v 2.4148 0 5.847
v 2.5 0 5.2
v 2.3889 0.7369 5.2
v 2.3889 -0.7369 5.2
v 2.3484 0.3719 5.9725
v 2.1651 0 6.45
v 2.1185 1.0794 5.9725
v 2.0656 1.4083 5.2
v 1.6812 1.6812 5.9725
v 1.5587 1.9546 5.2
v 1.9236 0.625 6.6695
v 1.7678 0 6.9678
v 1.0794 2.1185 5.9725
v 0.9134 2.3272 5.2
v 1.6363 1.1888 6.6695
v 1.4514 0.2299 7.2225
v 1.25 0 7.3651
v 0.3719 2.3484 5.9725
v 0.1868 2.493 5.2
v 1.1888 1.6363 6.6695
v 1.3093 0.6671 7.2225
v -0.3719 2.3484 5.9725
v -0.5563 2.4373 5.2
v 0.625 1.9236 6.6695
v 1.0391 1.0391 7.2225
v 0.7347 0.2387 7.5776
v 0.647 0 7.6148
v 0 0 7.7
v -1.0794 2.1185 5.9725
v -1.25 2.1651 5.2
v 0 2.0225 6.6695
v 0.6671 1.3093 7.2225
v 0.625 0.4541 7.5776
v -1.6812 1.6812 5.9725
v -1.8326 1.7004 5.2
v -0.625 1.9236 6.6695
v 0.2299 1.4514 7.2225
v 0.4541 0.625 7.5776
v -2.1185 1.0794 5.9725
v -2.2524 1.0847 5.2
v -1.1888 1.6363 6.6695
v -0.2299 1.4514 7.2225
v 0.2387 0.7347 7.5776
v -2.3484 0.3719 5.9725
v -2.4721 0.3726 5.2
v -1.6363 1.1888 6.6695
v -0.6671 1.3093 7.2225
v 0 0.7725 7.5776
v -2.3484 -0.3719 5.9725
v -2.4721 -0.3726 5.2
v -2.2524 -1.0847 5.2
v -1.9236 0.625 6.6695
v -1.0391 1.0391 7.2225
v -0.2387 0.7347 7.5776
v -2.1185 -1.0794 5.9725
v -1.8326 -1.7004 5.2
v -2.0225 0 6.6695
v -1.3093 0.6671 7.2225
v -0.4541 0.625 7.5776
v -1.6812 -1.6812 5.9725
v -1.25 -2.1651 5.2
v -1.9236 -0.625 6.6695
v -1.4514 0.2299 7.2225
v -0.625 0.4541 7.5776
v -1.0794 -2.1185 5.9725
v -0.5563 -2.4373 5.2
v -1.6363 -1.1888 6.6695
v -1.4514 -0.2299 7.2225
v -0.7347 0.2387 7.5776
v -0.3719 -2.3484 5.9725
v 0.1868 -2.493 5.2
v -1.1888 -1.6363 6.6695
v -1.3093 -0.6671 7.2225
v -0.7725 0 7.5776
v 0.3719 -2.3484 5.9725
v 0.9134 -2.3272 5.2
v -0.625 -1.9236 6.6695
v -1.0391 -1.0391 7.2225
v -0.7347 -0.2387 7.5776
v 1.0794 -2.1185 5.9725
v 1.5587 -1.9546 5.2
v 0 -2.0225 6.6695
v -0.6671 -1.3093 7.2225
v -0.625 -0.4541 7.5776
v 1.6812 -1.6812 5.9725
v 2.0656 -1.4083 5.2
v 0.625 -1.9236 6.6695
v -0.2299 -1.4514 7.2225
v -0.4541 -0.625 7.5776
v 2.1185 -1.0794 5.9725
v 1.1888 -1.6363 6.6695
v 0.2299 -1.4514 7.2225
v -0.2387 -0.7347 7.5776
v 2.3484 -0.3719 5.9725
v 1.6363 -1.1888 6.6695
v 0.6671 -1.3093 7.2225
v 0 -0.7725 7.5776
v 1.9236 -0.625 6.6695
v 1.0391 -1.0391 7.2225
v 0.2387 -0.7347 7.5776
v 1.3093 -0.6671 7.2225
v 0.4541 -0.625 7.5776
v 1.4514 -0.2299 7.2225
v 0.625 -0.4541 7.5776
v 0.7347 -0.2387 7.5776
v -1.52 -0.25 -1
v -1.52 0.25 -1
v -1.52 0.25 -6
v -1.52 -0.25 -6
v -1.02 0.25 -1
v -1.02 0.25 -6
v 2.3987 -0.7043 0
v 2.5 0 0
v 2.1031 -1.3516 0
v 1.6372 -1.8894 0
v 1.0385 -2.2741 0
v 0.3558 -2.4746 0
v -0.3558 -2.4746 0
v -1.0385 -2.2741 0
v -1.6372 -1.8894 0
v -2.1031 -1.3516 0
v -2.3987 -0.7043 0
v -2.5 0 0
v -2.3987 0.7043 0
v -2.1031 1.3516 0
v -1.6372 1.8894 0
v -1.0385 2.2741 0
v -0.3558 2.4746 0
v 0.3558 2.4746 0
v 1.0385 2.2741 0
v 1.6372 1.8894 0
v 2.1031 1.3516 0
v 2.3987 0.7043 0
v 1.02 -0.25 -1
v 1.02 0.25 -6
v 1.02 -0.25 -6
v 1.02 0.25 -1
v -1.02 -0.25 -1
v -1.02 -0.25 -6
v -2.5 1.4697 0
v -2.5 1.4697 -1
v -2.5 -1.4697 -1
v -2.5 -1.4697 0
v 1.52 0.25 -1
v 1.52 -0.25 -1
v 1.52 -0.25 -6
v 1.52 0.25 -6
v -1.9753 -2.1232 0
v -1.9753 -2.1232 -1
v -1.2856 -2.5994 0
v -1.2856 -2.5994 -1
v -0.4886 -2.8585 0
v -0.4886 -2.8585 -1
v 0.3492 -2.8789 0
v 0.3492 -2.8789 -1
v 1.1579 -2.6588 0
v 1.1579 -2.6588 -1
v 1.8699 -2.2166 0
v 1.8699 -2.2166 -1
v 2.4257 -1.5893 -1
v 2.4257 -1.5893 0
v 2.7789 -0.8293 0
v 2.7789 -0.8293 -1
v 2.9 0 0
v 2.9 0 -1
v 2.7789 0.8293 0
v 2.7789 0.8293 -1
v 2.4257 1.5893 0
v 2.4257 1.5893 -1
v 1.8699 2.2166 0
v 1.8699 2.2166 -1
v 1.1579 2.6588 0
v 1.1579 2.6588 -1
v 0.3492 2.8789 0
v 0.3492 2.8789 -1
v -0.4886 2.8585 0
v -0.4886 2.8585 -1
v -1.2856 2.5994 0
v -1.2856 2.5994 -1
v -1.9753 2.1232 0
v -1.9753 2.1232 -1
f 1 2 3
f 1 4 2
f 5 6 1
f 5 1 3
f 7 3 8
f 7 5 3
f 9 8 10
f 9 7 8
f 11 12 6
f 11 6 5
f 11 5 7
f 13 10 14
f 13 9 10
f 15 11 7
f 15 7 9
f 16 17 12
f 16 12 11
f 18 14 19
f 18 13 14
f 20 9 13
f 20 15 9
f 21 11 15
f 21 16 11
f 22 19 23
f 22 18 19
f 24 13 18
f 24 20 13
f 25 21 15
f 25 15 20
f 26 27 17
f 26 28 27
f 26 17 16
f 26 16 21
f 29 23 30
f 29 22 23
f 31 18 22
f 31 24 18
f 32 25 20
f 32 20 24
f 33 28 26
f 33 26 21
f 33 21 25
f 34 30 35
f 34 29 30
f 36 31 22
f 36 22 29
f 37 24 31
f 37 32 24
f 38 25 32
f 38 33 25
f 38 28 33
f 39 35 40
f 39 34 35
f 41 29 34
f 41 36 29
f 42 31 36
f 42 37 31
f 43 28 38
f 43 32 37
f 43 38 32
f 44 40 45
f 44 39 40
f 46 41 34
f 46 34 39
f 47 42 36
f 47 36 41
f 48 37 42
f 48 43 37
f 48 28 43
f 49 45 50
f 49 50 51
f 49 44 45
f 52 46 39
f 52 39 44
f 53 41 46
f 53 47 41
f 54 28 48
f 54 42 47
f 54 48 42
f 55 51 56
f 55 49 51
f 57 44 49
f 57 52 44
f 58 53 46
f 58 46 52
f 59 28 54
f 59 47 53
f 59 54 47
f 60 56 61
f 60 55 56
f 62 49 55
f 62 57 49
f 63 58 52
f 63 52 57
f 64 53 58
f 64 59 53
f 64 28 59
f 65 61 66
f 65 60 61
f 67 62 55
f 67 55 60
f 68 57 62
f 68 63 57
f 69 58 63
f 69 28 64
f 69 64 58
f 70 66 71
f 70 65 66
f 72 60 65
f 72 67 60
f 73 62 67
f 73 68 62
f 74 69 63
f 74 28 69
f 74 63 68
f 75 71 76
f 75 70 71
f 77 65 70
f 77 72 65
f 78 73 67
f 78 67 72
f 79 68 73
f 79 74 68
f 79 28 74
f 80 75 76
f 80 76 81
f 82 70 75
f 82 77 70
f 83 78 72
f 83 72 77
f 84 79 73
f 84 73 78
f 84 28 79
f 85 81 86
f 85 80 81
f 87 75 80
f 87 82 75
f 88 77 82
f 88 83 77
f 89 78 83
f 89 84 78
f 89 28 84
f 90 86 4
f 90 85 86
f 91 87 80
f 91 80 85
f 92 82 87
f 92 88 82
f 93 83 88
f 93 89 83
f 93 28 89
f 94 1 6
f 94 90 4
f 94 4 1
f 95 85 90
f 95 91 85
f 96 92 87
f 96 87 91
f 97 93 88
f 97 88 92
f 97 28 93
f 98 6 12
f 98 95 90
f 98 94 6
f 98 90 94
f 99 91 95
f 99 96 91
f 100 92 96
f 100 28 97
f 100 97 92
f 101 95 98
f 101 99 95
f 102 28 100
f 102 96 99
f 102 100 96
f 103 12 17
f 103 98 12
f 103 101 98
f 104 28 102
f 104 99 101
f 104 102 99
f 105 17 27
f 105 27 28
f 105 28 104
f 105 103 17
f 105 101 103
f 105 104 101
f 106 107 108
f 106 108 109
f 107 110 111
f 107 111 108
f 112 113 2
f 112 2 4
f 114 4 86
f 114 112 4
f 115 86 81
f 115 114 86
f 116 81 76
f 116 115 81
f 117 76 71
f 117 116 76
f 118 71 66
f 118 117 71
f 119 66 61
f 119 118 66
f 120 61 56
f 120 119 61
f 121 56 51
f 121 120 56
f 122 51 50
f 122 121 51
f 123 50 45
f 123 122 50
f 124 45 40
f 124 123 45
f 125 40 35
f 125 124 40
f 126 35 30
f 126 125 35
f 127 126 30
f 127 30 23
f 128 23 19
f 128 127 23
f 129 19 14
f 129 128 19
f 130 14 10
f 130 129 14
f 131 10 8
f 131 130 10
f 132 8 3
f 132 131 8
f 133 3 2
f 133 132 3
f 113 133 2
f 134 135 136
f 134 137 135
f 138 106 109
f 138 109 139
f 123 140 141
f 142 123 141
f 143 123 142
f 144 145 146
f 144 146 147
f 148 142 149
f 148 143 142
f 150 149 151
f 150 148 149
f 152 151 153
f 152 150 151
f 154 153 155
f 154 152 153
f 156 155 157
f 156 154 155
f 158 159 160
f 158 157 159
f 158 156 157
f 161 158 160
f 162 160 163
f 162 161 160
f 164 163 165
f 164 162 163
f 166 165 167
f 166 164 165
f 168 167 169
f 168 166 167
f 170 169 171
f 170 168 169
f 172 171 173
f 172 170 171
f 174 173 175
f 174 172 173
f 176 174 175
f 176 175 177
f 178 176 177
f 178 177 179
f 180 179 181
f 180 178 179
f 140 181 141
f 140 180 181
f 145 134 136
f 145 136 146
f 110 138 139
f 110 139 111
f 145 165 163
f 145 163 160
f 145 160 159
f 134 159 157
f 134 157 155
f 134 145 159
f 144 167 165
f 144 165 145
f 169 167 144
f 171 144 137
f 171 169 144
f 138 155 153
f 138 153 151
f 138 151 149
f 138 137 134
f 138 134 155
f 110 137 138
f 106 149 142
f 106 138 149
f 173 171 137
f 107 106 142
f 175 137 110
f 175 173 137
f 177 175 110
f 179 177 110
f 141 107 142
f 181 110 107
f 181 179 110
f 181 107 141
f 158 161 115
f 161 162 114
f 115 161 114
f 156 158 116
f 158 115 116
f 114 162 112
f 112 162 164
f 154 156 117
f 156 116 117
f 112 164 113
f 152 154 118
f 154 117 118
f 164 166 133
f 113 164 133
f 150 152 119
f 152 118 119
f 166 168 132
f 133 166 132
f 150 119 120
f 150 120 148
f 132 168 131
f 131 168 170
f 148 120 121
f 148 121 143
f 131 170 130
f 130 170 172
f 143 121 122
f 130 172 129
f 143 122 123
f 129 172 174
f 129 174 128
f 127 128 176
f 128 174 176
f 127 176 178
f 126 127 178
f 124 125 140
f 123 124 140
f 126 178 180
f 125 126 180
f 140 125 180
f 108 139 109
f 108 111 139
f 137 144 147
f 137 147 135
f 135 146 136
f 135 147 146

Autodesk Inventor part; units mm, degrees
ref_plane "YZ Plane" through (0, 0, 0) normal (1, 0, 0) x (0, 1, 0)
ref_plane "XZ Plane" through (0, 0, 0) normal (0, 1, 0) x (-1, 0, 0)
ref_plane "XY Plane" through (0, 0, 0) normal (0, 0, 1) x (1, 0, 0)
sketch "スケッチ1" plane through (0, 0, 0) normal (0, 0, 1) x (1, 0, 0)
  circle A0 centre (0, 0) radius 2.5
  dimension "d0" = 5
extrude "押し出し1" add sketch "スケッチ1" along normal blind 7.7
fillet "フィレット1" radius 2.5 1 edges at (-2.5, 0, 7.7)
sketch "スケッチ2" plane through (0, 0, 0) normal (0, 0, -1) x (-1, 0, 0)
  circle A0 centre (0, 0) radius 2.9
  line L0 (2.5, 1.4697) -> (2.5, -1.4697)
  circle A1 centre (0, 0) radius 2.5 projected
  dimension "d4" = 5.8
extrude "押し出し2" add sketch "スケッチ2" along normal blind 1 contours A1 | L0 A0 picked at (2.1443, -1.7224)
sketch "スケッチ3" plane through (0, 0, -1) normal (0, 0, -1) x (-1, 0, 0)
  line L0 (-1.52, 0.25) -> (-1.02, 0.25)
  line L1 (-1.02, 0.25) -> (-1.02, -0.25)
  line L2 (-1.02, -0.25) -> (-1.52, -0.25)
  line L3 (-1.52, -0.25) -> (-1.52, 0.25)
  line L4 (1.02, 0.25) -> (1.52, 0.25)
  line L5 (1.52, 0.25) -> (1.52, -0.25)
  line L6 (1.52, -0.25) -> (1.02, -0.25)
  line L7 (1.02, -0.25) -> (1.02, 0.25)
  line L8 (0, 1.603) -> (0, -1.603) construction
  line L9 (-1.27, -1.601) -> (-1.27, 1.6049) construction
  line L10 (1.27, 1.6049) -> (1.27, -1.601) construction
  point P0 (0, 0)
  point P1 (-1.02, 0)
  point P2 (1.02, 0)
  point P3 (0, 0)
  point P4 (-1.27, 0.25)
  point P5 (1.27, 0.25)
  dimension "d7" = 0.5
  dimension "d8" = 0.5
  dimension "d9" = 2.54
extrude "押し出し3" add sketch "スケッチ3" along normal blind 5
properties part number "LED"
